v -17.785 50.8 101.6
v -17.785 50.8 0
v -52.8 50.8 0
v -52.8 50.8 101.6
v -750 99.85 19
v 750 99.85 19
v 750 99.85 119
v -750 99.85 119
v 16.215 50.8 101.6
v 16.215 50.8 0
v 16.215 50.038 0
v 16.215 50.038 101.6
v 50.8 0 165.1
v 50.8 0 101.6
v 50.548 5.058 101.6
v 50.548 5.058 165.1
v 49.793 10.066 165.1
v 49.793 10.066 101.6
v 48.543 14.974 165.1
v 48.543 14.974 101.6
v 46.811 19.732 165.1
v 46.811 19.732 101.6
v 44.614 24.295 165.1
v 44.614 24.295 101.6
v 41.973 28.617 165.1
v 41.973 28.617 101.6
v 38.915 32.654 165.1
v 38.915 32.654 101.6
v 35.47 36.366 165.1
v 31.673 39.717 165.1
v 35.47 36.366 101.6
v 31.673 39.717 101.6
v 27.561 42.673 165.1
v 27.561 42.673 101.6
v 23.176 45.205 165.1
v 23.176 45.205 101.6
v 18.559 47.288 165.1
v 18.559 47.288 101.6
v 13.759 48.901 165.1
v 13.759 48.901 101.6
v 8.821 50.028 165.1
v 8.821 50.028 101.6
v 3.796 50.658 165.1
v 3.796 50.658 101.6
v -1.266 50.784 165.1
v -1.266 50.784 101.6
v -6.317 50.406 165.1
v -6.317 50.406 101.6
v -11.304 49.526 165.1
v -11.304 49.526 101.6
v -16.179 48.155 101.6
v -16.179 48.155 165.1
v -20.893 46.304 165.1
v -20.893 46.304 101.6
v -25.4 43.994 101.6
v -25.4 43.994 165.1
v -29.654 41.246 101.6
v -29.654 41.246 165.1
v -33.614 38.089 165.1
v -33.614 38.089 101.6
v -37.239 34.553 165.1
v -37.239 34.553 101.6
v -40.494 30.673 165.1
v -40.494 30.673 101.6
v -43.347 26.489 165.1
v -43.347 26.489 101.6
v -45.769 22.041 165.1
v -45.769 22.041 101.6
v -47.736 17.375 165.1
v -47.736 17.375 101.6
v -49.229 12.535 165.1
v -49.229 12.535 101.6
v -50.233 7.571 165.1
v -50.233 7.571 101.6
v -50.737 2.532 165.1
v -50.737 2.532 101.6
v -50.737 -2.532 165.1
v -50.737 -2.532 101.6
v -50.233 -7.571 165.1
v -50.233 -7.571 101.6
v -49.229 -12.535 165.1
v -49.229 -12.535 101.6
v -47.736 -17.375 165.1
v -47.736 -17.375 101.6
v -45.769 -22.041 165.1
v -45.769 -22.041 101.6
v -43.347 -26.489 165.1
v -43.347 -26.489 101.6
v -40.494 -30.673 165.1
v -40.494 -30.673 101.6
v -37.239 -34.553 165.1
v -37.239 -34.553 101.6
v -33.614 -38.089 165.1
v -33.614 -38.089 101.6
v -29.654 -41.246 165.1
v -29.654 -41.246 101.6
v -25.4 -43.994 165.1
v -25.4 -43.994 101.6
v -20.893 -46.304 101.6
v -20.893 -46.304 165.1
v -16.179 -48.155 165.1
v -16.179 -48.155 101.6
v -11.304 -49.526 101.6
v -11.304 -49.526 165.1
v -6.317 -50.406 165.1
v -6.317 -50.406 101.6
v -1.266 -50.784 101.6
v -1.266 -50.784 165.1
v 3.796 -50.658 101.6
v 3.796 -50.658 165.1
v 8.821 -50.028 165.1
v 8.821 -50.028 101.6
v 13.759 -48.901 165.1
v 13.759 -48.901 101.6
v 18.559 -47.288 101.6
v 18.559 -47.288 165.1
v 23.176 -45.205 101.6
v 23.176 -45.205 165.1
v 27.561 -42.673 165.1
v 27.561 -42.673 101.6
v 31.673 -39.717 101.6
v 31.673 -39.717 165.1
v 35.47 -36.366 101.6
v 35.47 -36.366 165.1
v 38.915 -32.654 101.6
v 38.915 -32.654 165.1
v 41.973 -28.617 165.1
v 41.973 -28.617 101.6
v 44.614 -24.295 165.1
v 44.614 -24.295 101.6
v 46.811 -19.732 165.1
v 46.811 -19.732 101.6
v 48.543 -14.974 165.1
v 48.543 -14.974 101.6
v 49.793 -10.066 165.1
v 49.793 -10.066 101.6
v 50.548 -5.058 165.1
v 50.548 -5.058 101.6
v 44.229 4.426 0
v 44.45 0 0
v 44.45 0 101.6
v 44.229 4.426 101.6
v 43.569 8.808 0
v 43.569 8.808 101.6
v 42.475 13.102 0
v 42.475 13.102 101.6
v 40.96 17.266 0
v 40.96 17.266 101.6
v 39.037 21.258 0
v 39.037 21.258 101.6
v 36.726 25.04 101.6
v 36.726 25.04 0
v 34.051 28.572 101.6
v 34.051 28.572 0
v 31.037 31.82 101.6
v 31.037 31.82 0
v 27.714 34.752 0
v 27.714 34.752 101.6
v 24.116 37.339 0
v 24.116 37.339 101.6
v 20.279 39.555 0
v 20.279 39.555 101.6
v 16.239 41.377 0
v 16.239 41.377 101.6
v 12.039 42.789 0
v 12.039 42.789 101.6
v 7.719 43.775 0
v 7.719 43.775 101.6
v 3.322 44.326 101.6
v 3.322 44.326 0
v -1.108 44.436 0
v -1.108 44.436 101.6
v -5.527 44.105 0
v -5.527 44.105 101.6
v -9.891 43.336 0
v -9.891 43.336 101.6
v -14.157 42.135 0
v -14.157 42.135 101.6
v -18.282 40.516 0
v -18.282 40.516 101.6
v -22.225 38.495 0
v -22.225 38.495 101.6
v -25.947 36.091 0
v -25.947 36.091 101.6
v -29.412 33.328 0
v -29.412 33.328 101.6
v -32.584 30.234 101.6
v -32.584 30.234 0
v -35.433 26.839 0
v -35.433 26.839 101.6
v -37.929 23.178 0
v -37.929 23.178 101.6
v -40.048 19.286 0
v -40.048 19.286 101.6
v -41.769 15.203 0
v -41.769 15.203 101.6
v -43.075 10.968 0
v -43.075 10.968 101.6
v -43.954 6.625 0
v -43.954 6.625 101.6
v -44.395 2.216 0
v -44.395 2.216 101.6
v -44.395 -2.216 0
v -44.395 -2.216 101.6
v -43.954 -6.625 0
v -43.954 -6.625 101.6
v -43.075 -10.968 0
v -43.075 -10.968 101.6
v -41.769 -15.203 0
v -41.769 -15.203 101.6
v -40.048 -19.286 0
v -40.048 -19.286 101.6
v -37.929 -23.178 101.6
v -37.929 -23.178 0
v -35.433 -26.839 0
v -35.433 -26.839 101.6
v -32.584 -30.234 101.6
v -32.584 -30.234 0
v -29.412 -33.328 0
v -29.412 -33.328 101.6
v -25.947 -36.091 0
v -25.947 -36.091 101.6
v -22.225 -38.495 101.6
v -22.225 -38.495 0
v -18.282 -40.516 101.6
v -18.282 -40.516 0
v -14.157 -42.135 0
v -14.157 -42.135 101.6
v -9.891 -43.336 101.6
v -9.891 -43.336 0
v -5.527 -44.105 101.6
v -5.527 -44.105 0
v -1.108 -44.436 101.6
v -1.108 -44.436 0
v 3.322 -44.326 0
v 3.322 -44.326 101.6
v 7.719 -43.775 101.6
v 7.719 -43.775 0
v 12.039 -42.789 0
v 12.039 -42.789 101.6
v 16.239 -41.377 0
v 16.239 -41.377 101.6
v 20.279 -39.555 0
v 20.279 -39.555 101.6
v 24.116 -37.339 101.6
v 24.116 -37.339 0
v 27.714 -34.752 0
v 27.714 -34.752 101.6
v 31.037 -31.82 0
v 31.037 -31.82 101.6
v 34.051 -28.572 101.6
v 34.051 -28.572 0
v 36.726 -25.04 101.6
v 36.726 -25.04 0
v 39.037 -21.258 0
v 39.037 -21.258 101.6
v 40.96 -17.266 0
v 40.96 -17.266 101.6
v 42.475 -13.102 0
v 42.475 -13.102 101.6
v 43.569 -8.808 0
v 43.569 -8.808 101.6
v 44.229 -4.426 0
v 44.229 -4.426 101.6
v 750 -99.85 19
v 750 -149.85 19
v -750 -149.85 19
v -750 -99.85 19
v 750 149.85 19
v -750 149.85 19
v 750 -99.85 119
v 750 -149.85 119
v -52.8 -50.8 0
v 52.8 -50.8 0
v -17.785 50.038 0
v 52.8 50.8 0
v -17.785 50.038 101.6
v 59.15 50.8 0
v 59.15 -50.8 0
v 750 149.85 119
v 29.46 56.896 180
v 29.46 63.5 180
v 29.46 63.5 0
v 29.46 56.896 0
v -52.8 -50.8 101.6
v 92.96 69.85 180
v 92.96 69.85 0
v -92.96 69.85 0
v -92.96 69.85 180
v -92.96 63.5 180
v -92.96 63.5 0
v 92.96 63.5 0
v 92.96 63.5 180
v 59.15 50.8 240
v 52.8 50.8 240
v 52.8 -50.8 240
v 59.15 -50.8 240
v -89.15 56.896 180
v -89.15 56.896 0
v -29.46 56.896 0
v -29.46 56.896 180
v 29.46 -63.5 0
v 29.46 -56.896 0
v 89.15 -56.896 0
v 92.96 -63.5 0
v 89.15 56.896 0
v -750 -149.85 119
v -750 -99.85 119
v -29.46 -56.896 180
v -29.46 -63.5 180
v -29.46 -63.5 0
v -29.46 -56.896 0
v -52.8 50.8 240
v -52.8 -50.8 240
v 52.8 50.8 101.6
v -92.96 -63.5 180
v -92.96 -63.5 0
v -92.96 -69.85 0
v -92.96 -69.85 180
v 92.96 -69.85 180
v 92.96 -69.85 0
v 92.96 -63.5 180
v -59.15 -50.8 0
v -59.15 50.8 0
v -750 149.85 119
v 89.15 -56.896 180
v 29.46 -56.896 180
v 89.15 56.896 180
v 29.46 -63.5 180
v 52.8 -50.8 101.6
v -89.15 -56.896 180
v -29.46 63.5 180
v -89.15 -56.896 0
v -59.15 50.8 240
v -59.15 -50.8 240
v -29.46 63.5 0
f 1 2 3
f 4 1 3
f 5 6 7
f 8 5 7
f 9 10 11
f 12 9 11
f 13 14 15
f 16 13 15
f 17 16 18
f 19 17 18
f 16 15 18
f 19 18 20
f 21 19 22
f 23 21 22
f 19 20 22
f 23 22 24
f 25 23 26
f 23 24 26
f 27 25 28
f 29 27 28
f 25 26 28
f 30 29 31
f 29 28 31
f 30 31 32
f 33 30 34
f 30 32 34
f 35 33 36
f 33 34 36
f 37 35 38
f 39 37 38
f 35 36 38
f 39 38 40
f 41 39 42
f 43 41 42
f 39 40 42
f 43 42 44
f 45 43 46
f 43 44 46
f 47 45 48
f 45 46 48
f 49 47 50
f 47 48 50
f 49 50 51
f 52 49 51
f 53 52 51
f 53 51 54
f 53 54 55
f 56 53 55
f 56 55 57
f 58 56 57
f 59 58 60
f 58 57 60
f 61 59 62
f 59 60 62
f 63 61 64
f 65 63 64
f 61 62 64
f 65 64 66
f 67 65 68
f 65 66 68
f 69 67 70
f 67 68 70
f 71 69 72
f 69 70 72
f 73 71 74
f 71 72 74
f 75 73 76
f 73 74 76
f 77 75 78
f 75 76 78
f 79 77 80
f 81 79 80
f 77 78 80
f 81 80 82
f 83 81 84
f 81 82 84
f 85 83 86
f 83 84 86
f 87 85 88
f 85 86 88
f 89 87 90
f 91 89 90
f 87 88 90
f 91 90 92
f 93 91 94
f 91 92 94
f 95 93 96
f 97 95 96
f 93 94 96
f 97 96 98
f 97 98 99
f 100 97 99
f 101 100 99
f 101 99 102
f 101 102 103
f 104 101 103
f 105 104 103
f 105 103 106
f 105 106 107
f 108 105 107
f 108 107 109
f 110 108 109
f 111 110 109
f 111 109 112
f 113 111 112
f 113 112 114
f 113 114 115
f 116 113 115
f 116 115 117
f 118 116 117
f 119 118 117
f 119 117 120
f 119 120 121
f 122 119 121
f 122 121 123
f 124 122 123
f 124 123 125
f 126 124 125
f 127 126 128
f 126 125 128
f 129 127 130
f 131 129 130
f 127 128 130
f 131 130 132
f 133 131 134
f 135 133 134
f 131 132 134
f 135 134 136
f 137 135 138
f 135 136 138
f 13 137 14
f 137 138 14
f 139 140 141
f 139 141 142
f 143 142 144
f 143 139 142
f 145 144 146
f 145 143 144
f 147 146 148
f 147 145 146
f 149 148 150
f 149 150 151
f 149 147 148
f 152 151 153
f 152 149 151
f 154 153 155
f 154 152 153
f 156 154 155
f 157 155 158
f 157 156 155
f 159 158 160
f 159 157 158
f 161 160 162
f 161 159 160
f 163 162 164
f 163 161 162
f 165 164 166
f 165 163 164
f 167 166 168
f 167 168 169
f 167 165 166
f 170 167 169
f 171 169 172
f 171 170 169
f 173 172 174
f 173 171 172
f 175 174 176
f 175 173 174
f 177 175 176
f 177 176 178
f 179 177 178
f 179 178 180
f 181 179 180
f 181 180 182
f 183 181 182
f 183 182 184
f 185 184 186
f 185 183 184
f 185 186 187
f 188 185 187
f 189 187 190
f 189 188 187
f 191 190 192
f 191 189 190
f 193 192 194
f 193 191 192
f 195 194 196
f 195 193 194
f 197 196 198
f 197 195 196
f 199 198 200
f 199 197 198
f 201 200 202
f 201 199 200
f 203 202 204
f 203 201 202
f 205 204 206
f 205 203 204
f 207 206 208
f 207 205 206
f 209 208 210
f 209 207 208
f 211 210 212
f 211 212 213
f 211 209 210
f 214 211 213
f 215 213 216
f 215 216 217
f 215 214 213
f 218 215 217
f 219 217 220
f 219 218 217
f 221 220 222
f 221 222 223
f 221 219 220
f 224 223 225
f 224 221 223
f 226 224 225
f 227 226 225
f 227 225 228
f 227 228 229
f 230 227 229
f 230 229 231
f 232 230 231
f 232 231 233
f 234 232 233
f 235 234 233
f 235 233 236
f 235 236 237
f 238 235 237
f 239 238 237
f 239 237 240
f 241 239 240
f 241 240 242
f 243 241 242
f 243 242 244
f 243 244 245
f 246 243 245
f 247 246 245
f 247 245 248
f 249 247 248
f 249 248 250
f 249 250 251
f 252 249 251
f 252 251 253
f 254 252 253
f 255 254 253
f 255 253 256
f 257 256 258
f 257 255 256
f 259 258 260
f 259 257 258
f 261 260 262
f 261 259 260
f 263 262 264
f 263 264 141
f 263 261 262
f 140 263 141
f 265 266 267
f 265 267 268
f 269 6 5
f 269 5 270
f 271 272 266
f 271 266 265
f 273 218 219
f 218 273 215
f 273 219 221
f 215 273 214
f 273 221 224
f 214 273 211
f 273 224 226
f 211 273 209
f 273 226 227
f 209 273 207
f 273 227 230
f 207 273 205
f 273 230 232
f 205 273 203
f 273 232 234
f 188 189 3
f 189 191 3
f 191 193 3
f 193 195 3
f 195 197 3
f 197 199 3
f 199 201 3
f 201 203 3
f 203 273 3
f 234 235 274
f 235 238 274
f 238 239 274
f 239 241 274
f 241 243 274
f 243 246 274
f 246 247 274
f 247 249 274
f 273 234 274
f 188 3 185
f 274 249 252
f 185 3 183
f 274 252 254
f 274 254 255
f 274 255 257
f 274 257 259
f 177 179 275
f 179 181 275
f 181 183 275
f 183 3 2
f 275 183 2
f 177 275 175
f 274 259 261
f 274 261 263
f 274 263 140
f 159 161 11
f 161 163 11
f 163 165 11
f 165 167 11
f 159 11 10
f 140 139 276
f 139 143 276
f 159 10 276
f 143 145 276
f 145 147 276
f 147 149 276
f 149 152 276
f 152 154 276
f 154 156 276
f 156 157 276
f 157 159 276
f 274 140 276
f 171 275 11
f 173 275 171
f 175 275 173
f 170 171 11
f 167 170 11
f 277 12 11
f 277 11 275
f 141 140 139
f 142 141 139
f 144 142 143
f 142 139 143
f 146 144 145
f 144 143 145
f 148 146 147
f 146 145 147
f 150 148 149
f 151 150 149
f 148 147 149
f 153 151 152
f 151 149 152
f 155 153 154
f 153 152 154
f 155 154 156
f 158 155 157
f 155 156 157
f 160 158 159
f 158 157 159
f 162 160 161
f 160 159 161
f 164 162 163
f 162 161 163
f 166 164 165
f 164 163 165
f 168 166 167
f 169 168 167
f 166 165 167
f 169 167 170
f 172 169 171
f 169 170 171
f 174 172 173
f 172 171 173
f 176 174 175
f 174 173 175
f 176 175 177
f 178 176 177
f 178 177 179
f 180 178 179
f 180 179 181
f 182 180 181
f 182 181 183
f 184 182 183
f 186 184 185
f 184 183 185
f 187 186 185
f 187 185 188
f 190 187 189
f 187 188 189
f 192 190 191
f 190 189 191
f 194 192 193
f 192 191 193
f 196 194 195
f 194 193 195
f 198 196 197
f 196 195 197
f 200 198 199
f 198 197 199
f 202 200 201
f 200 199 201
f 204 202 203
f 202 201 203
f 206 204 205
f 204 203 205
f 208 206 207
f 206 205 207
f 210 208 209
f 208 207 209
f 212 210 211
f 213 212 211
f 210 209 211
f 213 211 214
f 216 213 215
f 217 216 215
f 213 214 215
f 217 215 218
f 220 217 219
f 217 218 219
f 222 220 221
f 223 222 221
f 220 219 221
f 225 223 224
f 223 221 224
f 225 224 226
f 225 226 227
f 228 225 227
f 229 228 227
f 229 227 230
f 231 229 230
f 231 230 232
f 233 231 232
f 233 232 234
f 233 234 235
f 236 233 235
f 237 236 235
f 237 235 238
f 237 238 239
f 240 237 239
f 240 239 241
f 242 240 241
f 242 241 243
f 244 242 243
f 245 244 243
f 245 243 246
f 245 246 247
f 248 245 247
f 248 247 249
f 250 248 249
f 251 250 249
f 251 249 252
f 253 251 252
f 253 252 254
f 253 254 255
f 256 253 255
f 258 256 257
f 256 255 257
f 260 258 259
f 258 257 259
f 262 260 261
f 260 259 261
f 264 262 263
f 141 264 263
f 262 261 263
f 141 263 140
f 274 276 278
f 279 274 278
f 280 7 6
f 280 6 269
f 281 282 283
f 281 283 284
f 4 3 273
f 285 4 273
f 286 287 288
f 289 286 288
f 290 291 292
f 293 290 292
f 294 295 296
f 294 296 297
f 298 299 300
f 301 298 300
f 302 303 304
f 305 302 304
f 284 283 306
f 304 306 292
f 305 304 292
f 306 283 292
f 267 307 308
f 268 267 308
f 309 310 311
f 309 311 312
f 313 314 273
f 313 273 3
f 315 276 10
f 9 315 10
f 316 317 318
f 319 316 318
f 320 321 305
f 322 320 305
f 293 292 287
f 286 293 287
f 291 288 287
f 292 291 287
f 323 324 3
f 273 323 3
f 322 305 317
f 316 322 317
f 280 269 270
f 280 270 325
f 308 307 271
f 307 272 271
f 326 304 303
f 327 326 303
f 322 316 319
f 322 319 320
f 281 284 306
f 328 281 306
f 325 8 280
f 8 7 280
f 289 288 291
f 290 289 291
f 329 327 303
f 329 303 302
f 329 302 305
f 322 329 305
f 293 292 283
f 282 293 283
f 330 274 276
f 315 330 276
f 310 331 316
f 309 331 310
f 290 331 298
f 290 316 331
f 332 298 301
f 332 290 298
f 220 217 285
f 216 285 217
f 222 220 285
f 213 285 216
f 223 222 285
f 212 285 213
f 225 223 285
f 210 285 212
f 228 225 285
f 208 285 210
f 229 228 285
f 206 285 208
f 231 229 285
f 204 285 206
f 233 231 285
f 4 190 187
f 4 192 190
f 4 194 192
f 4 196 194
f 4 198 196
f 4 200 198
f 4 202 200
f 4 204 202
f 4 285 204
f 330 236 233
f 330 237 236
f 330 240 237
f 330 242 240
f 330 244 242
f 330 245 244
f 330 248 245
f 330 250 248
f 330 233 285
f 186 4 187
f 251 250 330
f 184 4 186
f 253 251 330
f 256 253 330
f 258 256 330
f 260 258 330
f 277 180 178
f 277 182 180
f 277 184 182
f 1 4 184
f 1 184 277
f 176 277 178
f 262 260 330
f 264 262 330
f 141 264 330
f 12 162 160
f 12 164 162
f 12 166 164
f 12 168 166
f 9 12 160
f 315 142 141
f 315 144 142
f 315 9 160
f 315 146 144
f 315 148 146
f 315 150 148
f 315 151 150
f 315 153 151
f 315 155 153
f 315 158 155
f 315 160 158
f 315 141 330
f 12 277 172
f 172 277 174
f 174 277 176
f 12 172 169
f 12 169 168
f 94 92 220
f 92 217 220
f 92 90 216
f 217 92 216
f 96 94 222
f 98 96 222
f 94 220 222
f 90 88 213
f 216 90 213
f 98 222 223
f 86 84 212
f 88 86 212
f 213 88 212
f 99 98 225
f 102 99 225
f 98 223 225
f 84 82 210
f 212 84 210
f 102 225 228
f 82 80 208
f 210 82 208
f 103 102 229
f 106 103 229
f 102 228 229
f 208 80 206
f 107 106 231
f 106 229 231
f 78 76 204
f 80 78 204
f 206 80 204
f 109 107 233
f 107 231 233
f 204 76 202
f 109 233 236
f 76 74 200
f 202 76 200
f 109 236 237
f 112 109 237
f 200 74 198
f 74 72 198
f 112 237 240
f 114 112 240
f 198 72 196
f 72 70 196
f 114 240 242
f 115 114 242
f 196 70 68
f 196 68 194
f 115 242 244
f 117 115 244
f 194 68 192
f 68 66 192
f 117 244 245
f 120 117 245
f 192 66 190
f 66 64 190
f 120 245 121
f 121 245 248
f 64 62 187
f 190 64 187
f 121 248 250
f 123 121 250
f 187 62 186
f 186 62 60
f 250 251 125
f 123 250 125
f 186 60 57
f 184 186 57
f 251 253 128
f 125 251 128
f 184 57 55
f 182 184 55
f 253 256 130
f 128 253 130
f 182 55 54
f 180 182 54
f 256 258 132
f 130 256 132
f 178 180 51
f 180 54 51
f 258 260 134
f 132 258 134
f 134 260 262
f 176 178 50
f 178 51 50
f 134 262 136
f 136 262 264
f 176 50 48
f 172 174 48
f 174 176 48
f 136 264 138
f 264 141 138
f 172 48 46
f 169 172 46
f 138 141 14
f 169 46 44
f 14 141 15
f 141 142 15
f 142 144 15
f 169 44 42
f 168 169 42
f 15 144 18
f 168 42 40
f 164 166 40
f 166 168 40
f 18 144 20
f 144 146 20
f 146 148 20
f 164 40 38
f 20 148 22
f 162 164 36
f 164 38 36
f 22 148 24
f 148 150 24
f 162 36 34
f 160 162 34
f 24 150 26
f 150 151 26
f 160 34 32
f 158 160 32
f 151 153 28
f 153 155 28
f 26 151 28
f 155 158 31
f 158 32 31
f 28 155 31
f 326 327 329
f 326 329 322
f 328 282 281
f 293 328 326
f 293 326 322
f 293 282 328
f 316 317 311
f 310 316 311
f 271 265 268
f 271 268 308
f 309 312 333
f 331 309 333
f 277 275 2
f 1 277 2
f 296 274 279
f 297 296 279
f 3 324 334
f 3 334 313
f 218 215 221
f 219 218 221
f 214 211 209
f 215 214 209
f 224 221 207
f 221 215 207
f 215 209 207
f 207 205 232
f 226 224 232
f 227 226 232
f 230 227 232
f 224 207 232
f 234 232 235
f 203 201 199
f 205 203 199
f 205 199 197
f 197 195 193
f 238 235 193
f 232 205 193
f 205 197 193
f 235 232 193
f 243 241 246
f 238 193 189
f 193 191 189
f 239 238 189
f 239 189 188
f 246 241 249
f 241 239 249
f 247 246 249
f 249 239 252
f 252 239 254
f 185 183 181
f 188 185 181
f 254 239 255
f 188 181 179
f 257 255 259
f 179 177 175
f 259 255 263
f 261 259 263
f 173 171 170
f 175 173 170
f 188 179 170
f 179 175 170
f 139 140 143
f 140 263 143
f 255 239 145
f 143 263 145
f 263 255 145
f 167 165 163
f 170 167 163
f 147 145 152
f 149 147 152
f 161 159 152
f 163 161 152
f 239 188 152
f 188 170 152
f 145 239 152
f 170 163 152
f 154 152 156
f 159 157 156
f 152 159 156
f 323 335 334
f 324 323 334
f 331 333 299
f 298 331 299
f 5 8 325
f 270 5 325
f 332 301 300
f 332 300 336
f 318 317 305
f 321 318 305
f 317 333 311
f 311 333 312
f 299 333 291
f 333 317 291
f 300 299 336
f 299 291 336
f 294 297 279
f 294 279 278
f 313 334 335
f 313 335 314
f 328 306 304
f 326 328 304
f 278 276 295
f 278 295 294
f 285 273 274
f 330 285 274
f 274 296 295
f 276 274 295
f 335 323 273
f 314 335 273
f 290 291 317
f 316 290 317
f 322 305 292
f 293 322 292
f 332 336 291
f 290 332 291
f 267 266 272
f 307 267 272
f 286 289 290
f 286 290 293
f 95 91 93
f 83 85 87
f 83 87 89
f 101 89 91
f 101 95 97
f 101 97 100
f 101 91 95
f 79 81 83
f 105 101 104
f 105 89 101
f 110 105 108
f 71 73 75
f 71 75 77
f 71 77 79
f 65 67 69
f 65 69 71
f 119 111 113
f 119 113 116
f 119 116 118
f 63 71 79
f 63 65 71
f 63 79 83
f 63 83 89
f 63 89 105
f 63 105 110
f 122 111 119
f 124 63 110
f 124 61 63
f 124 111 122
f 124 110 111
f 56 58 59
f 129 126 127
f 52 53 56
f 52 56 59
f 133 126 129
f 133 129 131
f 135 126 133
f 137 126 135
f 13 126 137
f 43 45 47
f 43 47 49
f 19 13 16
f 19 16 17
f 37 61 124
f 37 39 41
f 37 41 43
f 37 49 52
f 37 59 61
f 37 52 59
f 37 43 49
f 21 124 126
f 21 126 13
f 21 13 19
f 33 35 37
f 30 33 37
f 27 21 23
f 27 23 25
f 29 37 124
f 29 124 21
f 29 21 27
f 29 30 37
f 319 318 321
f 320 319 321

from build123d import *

# Parameters (mm, degrees)
F0_R      = 44.45
F1_DEPTH  = 101.6
F2_R      = 50.8
F2_R_2    = 44.45
F3_DEPTH  = 63.5
F4_DEPTH  = 101.6
F7_DEPTH  = 180
F0_W      = 6.35
F0_H      = 101.6
F8_DEPTH  = 240
F9_DEPTH  = 180
F10_W     = 50
F10_H     = 100
F11_DEPTH = 750


with BuildPart() as f1:
    # F0 (on Top) → F1 (new body)
    with BuildSketch(Plane.XY):
        Circle(F0_R)
    extrude(amount=F1_DEPTH)

    # F2 (on face) → F3 (join)
    with BuildSketch(Plane.XY.offset(101.6)):
        Circle(F2_R)
        Circle(F2_R_2, mode=Mode.SUBTRACT)
        Circle(F2_R_2)
    extrude(amount=F3_DEPTH)


with BuildPart() as f4:
    # F0 (on Top) → F4 (new body, through all)
    with BuildSketch(Plane.XY):
        Polygon((52.8, -50.8), (52.8, 50.8), (16.2152014673, 50.8), (16.2152014673, 50.0381626189), (-17.7847985327, 50.0381626189), (-17.7847985327, 50.8), (-52.8, 50.8), (-52.8, -50.8), align=None)
        Circle(F0_R, mode=Mode.SUBTRACT)
    extrude(amount=F4_DEPTH)


with BuildPart() as f7:
    # F0 (on Top) → F7 (new body)
    with BuildSketch(Plane.XY):
        Polygon((-29.46, 56.896), (-29.46, 63.5), (-92.96, 63.5), (-92.96, 0), (-92.96, -63.5), (-29.46, -63.5), (-29.46, -56.896), (-89.15, -56.896), (-89.15, 0), (-89.15, 56.896), align=None)
    extrude(amount=F7_DEPTH)


with BuildPart() as f7b:
    # F0 (on Top) → F7, piece 2 (new body)
    with BuildSketch(Plane.XY):
        Polygon((89.15, 56.896), (89.15, 0), (89.15, -56.896), (29.46, -56.896), (29.46, -63.5), (92.96, -63.5), (92.96, 0), (92.96, 63.5), (29.46, 63.5), (29.46, 56.896), align=None)
    extrude(amount=F7_DEPTH)


with BuildPart() as f8:
    # F0 (on Top) → F8 (new body)
    with BuildSketch(Plane.XY):
        with Locations((-55.975, 0)):
            Rectangle(F0_W, F0_H)
    extrude(amount=F8_DEPTH)


with BuildPart() as f8b:
    # F0 (on Top) → F8, piece 2 (new body)
    with BuildSketch(Plane.XY):
        with Locations((55.975, 0)):
            Rectangle(F0_W, F0_H)
    extrude(amount=F8_DEPTH)


with BuildPart() as f9:
    # F0 (on Top) → F9 (new body, through all)
    with BuildSketch(Plane.XY):
        Polygon((-29.46, 63.5), (29.46, 63.5), (92.96, 63.5), (92.96, 69.85), (-92.96, 69.85), (-92.96, 63.5), align=None)
    extrude(amount=F9_DEPTH)


with BuildPart() as f9b:
    # F0 (on Top) → F9, piece 2 (new body, through all)
    with BuildSketch(Plane.XY):
        Polygon((92.96, -63.5), (29.46, -63.5), (-29.46, -63.5), (-92.96, -63.5), (-92.96, -69.85), (92.96, -69.85), align=None)
    extrude(amount=F9_DEPTH)


with BuildPart() as f11:
    # F10 (on Right) → F11 (new body, symmetric)
    with BuildSketch(Plane.YZ):
        with Locations((-124.85, 69)):
            Rectangle(F10_W, F10_H)
    extrude(amount=F11_DEPTH, both=True)


with BuildPart() as f11b:
    # F10 (on Right) → F11, piece 2 (new body, symmetric)
    with BuildSketch(Plane.YZ):
        with Locations((124.85, 69)):
            Rectangle(F10_W, F10_H)
    extrude(amount=F11_DEPTH, both=True)


solid = Compound([f1.part, f4.part, f7.part, f7b.part, f8.part, f8b.part, f9.part, f9b.part, f11.part, f11b.part])
